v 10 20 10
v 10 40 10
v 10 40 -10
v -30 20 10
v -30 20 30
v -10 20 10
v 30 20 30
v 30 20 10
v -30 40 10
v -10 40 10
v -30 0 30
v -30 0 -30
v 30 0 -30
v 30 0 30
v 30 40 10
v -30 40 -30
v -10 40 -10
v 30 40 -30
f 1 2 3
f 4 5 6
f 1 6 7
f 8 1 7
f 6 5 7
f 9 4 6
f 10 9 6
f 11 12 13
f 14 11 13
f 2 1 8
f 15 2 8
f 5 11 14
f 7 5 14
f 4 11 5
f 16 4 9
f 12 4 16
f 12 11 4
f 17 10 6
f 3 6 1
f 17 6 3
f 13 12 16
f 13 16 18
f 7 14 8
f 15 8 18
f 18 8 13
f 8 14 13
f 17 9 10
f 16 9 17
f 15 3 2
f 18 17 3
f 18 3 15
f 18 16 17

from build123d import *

# Parameters (mm, degrees)
SKETCH10_W              = 60
SKETCH10_H              = 60
BOSS_EXTRUDE6_DEPTH     = 40
SKETCH12_W              = 60
SKETCH12_H              = 20
CUT_EXTRUDE4_DEPTH      = 20
CUT_EXTRUDE7_DEPTH      = 79.102496759
CUT_EXTRUDE7_DEPTH_BACK = 79.102496759
SKETCH26_W              = 20
SKETCH26_H              = 20
BOSS_EXTRUDE8_DEPTH     = 20
SKETCH30_W              = 20
SKETCH30_H              = 20
BOSS_EXTRUDE10_DEPTH    = 20


with BuildPart() as part:
    # Sketch10 → Boss-Extrude6 (new body)
    with BuildSketch(Plane(origin=(0, 0, 0), x_dir=(1, 0, 0), z_dir=(0, 1, 0))):
        Rectangle(SKETCH10_W, SKETCH10_H)
    extrude(amount=BOSS_EXTRUDE6_DEPTH)

    # Sketch12 → Cut-Extrude4 (cut)
    with BuildSketch(Plane.XY.offset(30)):
        with Locations((0, 30)):
            Rectangle(SKETCH12_W, SKETCH12_H)
    extrude(amount=-CUT_EXTRUDE4_DEPTH, mode=Mode.SUBTRACT)

    # Sketch25 → Cut-Extrude7 (cut, two sides: drawn at the far end of the back side and taken through both)
    with BuildSketch(Plane(origin=(30, 0, 0), x_dir=(0, 0, -1), z_dir=(1, 0, 0)).offset(-CUT_EXTRUDE7_DEPTH_BACK)):
        Polygon((-10, 40), (-10, 20), (10, 40), align=None)
    extrude(amount=CUT_EXTRUDE7_DEPTH + CUT_EXTRUDE7_DEPTH_BACK, mode=Mode.SUBTRACT)

    # Sketch26 → Boss-Extrude8 (add)
    with BuildSketch(Plane(origin=(0, 20, 0), x_dir=(1, 0, 0), z_dir=(0, 1, 0))):
        with Locations((-20, 0)):
            Rectangle(SKETCH26_W, SKETCH26_H)
    extrude(amount=BOSS_EXTRUDE8_DEPTH)

    # Sketch30 → Boss-Extrude10 (add)
    with BuildSketch(Plane(origin=(0, 20, 0), x_dir=(1, 0, 0), z_dir=(0, 1, 0))):
        with Locations((20, 0)):
            Rectangle(SKETCH30_W, SKETCH30_H)
    extrude(amount=BOSS_EXTRUDE10_DEPTH)


solid = part.part
